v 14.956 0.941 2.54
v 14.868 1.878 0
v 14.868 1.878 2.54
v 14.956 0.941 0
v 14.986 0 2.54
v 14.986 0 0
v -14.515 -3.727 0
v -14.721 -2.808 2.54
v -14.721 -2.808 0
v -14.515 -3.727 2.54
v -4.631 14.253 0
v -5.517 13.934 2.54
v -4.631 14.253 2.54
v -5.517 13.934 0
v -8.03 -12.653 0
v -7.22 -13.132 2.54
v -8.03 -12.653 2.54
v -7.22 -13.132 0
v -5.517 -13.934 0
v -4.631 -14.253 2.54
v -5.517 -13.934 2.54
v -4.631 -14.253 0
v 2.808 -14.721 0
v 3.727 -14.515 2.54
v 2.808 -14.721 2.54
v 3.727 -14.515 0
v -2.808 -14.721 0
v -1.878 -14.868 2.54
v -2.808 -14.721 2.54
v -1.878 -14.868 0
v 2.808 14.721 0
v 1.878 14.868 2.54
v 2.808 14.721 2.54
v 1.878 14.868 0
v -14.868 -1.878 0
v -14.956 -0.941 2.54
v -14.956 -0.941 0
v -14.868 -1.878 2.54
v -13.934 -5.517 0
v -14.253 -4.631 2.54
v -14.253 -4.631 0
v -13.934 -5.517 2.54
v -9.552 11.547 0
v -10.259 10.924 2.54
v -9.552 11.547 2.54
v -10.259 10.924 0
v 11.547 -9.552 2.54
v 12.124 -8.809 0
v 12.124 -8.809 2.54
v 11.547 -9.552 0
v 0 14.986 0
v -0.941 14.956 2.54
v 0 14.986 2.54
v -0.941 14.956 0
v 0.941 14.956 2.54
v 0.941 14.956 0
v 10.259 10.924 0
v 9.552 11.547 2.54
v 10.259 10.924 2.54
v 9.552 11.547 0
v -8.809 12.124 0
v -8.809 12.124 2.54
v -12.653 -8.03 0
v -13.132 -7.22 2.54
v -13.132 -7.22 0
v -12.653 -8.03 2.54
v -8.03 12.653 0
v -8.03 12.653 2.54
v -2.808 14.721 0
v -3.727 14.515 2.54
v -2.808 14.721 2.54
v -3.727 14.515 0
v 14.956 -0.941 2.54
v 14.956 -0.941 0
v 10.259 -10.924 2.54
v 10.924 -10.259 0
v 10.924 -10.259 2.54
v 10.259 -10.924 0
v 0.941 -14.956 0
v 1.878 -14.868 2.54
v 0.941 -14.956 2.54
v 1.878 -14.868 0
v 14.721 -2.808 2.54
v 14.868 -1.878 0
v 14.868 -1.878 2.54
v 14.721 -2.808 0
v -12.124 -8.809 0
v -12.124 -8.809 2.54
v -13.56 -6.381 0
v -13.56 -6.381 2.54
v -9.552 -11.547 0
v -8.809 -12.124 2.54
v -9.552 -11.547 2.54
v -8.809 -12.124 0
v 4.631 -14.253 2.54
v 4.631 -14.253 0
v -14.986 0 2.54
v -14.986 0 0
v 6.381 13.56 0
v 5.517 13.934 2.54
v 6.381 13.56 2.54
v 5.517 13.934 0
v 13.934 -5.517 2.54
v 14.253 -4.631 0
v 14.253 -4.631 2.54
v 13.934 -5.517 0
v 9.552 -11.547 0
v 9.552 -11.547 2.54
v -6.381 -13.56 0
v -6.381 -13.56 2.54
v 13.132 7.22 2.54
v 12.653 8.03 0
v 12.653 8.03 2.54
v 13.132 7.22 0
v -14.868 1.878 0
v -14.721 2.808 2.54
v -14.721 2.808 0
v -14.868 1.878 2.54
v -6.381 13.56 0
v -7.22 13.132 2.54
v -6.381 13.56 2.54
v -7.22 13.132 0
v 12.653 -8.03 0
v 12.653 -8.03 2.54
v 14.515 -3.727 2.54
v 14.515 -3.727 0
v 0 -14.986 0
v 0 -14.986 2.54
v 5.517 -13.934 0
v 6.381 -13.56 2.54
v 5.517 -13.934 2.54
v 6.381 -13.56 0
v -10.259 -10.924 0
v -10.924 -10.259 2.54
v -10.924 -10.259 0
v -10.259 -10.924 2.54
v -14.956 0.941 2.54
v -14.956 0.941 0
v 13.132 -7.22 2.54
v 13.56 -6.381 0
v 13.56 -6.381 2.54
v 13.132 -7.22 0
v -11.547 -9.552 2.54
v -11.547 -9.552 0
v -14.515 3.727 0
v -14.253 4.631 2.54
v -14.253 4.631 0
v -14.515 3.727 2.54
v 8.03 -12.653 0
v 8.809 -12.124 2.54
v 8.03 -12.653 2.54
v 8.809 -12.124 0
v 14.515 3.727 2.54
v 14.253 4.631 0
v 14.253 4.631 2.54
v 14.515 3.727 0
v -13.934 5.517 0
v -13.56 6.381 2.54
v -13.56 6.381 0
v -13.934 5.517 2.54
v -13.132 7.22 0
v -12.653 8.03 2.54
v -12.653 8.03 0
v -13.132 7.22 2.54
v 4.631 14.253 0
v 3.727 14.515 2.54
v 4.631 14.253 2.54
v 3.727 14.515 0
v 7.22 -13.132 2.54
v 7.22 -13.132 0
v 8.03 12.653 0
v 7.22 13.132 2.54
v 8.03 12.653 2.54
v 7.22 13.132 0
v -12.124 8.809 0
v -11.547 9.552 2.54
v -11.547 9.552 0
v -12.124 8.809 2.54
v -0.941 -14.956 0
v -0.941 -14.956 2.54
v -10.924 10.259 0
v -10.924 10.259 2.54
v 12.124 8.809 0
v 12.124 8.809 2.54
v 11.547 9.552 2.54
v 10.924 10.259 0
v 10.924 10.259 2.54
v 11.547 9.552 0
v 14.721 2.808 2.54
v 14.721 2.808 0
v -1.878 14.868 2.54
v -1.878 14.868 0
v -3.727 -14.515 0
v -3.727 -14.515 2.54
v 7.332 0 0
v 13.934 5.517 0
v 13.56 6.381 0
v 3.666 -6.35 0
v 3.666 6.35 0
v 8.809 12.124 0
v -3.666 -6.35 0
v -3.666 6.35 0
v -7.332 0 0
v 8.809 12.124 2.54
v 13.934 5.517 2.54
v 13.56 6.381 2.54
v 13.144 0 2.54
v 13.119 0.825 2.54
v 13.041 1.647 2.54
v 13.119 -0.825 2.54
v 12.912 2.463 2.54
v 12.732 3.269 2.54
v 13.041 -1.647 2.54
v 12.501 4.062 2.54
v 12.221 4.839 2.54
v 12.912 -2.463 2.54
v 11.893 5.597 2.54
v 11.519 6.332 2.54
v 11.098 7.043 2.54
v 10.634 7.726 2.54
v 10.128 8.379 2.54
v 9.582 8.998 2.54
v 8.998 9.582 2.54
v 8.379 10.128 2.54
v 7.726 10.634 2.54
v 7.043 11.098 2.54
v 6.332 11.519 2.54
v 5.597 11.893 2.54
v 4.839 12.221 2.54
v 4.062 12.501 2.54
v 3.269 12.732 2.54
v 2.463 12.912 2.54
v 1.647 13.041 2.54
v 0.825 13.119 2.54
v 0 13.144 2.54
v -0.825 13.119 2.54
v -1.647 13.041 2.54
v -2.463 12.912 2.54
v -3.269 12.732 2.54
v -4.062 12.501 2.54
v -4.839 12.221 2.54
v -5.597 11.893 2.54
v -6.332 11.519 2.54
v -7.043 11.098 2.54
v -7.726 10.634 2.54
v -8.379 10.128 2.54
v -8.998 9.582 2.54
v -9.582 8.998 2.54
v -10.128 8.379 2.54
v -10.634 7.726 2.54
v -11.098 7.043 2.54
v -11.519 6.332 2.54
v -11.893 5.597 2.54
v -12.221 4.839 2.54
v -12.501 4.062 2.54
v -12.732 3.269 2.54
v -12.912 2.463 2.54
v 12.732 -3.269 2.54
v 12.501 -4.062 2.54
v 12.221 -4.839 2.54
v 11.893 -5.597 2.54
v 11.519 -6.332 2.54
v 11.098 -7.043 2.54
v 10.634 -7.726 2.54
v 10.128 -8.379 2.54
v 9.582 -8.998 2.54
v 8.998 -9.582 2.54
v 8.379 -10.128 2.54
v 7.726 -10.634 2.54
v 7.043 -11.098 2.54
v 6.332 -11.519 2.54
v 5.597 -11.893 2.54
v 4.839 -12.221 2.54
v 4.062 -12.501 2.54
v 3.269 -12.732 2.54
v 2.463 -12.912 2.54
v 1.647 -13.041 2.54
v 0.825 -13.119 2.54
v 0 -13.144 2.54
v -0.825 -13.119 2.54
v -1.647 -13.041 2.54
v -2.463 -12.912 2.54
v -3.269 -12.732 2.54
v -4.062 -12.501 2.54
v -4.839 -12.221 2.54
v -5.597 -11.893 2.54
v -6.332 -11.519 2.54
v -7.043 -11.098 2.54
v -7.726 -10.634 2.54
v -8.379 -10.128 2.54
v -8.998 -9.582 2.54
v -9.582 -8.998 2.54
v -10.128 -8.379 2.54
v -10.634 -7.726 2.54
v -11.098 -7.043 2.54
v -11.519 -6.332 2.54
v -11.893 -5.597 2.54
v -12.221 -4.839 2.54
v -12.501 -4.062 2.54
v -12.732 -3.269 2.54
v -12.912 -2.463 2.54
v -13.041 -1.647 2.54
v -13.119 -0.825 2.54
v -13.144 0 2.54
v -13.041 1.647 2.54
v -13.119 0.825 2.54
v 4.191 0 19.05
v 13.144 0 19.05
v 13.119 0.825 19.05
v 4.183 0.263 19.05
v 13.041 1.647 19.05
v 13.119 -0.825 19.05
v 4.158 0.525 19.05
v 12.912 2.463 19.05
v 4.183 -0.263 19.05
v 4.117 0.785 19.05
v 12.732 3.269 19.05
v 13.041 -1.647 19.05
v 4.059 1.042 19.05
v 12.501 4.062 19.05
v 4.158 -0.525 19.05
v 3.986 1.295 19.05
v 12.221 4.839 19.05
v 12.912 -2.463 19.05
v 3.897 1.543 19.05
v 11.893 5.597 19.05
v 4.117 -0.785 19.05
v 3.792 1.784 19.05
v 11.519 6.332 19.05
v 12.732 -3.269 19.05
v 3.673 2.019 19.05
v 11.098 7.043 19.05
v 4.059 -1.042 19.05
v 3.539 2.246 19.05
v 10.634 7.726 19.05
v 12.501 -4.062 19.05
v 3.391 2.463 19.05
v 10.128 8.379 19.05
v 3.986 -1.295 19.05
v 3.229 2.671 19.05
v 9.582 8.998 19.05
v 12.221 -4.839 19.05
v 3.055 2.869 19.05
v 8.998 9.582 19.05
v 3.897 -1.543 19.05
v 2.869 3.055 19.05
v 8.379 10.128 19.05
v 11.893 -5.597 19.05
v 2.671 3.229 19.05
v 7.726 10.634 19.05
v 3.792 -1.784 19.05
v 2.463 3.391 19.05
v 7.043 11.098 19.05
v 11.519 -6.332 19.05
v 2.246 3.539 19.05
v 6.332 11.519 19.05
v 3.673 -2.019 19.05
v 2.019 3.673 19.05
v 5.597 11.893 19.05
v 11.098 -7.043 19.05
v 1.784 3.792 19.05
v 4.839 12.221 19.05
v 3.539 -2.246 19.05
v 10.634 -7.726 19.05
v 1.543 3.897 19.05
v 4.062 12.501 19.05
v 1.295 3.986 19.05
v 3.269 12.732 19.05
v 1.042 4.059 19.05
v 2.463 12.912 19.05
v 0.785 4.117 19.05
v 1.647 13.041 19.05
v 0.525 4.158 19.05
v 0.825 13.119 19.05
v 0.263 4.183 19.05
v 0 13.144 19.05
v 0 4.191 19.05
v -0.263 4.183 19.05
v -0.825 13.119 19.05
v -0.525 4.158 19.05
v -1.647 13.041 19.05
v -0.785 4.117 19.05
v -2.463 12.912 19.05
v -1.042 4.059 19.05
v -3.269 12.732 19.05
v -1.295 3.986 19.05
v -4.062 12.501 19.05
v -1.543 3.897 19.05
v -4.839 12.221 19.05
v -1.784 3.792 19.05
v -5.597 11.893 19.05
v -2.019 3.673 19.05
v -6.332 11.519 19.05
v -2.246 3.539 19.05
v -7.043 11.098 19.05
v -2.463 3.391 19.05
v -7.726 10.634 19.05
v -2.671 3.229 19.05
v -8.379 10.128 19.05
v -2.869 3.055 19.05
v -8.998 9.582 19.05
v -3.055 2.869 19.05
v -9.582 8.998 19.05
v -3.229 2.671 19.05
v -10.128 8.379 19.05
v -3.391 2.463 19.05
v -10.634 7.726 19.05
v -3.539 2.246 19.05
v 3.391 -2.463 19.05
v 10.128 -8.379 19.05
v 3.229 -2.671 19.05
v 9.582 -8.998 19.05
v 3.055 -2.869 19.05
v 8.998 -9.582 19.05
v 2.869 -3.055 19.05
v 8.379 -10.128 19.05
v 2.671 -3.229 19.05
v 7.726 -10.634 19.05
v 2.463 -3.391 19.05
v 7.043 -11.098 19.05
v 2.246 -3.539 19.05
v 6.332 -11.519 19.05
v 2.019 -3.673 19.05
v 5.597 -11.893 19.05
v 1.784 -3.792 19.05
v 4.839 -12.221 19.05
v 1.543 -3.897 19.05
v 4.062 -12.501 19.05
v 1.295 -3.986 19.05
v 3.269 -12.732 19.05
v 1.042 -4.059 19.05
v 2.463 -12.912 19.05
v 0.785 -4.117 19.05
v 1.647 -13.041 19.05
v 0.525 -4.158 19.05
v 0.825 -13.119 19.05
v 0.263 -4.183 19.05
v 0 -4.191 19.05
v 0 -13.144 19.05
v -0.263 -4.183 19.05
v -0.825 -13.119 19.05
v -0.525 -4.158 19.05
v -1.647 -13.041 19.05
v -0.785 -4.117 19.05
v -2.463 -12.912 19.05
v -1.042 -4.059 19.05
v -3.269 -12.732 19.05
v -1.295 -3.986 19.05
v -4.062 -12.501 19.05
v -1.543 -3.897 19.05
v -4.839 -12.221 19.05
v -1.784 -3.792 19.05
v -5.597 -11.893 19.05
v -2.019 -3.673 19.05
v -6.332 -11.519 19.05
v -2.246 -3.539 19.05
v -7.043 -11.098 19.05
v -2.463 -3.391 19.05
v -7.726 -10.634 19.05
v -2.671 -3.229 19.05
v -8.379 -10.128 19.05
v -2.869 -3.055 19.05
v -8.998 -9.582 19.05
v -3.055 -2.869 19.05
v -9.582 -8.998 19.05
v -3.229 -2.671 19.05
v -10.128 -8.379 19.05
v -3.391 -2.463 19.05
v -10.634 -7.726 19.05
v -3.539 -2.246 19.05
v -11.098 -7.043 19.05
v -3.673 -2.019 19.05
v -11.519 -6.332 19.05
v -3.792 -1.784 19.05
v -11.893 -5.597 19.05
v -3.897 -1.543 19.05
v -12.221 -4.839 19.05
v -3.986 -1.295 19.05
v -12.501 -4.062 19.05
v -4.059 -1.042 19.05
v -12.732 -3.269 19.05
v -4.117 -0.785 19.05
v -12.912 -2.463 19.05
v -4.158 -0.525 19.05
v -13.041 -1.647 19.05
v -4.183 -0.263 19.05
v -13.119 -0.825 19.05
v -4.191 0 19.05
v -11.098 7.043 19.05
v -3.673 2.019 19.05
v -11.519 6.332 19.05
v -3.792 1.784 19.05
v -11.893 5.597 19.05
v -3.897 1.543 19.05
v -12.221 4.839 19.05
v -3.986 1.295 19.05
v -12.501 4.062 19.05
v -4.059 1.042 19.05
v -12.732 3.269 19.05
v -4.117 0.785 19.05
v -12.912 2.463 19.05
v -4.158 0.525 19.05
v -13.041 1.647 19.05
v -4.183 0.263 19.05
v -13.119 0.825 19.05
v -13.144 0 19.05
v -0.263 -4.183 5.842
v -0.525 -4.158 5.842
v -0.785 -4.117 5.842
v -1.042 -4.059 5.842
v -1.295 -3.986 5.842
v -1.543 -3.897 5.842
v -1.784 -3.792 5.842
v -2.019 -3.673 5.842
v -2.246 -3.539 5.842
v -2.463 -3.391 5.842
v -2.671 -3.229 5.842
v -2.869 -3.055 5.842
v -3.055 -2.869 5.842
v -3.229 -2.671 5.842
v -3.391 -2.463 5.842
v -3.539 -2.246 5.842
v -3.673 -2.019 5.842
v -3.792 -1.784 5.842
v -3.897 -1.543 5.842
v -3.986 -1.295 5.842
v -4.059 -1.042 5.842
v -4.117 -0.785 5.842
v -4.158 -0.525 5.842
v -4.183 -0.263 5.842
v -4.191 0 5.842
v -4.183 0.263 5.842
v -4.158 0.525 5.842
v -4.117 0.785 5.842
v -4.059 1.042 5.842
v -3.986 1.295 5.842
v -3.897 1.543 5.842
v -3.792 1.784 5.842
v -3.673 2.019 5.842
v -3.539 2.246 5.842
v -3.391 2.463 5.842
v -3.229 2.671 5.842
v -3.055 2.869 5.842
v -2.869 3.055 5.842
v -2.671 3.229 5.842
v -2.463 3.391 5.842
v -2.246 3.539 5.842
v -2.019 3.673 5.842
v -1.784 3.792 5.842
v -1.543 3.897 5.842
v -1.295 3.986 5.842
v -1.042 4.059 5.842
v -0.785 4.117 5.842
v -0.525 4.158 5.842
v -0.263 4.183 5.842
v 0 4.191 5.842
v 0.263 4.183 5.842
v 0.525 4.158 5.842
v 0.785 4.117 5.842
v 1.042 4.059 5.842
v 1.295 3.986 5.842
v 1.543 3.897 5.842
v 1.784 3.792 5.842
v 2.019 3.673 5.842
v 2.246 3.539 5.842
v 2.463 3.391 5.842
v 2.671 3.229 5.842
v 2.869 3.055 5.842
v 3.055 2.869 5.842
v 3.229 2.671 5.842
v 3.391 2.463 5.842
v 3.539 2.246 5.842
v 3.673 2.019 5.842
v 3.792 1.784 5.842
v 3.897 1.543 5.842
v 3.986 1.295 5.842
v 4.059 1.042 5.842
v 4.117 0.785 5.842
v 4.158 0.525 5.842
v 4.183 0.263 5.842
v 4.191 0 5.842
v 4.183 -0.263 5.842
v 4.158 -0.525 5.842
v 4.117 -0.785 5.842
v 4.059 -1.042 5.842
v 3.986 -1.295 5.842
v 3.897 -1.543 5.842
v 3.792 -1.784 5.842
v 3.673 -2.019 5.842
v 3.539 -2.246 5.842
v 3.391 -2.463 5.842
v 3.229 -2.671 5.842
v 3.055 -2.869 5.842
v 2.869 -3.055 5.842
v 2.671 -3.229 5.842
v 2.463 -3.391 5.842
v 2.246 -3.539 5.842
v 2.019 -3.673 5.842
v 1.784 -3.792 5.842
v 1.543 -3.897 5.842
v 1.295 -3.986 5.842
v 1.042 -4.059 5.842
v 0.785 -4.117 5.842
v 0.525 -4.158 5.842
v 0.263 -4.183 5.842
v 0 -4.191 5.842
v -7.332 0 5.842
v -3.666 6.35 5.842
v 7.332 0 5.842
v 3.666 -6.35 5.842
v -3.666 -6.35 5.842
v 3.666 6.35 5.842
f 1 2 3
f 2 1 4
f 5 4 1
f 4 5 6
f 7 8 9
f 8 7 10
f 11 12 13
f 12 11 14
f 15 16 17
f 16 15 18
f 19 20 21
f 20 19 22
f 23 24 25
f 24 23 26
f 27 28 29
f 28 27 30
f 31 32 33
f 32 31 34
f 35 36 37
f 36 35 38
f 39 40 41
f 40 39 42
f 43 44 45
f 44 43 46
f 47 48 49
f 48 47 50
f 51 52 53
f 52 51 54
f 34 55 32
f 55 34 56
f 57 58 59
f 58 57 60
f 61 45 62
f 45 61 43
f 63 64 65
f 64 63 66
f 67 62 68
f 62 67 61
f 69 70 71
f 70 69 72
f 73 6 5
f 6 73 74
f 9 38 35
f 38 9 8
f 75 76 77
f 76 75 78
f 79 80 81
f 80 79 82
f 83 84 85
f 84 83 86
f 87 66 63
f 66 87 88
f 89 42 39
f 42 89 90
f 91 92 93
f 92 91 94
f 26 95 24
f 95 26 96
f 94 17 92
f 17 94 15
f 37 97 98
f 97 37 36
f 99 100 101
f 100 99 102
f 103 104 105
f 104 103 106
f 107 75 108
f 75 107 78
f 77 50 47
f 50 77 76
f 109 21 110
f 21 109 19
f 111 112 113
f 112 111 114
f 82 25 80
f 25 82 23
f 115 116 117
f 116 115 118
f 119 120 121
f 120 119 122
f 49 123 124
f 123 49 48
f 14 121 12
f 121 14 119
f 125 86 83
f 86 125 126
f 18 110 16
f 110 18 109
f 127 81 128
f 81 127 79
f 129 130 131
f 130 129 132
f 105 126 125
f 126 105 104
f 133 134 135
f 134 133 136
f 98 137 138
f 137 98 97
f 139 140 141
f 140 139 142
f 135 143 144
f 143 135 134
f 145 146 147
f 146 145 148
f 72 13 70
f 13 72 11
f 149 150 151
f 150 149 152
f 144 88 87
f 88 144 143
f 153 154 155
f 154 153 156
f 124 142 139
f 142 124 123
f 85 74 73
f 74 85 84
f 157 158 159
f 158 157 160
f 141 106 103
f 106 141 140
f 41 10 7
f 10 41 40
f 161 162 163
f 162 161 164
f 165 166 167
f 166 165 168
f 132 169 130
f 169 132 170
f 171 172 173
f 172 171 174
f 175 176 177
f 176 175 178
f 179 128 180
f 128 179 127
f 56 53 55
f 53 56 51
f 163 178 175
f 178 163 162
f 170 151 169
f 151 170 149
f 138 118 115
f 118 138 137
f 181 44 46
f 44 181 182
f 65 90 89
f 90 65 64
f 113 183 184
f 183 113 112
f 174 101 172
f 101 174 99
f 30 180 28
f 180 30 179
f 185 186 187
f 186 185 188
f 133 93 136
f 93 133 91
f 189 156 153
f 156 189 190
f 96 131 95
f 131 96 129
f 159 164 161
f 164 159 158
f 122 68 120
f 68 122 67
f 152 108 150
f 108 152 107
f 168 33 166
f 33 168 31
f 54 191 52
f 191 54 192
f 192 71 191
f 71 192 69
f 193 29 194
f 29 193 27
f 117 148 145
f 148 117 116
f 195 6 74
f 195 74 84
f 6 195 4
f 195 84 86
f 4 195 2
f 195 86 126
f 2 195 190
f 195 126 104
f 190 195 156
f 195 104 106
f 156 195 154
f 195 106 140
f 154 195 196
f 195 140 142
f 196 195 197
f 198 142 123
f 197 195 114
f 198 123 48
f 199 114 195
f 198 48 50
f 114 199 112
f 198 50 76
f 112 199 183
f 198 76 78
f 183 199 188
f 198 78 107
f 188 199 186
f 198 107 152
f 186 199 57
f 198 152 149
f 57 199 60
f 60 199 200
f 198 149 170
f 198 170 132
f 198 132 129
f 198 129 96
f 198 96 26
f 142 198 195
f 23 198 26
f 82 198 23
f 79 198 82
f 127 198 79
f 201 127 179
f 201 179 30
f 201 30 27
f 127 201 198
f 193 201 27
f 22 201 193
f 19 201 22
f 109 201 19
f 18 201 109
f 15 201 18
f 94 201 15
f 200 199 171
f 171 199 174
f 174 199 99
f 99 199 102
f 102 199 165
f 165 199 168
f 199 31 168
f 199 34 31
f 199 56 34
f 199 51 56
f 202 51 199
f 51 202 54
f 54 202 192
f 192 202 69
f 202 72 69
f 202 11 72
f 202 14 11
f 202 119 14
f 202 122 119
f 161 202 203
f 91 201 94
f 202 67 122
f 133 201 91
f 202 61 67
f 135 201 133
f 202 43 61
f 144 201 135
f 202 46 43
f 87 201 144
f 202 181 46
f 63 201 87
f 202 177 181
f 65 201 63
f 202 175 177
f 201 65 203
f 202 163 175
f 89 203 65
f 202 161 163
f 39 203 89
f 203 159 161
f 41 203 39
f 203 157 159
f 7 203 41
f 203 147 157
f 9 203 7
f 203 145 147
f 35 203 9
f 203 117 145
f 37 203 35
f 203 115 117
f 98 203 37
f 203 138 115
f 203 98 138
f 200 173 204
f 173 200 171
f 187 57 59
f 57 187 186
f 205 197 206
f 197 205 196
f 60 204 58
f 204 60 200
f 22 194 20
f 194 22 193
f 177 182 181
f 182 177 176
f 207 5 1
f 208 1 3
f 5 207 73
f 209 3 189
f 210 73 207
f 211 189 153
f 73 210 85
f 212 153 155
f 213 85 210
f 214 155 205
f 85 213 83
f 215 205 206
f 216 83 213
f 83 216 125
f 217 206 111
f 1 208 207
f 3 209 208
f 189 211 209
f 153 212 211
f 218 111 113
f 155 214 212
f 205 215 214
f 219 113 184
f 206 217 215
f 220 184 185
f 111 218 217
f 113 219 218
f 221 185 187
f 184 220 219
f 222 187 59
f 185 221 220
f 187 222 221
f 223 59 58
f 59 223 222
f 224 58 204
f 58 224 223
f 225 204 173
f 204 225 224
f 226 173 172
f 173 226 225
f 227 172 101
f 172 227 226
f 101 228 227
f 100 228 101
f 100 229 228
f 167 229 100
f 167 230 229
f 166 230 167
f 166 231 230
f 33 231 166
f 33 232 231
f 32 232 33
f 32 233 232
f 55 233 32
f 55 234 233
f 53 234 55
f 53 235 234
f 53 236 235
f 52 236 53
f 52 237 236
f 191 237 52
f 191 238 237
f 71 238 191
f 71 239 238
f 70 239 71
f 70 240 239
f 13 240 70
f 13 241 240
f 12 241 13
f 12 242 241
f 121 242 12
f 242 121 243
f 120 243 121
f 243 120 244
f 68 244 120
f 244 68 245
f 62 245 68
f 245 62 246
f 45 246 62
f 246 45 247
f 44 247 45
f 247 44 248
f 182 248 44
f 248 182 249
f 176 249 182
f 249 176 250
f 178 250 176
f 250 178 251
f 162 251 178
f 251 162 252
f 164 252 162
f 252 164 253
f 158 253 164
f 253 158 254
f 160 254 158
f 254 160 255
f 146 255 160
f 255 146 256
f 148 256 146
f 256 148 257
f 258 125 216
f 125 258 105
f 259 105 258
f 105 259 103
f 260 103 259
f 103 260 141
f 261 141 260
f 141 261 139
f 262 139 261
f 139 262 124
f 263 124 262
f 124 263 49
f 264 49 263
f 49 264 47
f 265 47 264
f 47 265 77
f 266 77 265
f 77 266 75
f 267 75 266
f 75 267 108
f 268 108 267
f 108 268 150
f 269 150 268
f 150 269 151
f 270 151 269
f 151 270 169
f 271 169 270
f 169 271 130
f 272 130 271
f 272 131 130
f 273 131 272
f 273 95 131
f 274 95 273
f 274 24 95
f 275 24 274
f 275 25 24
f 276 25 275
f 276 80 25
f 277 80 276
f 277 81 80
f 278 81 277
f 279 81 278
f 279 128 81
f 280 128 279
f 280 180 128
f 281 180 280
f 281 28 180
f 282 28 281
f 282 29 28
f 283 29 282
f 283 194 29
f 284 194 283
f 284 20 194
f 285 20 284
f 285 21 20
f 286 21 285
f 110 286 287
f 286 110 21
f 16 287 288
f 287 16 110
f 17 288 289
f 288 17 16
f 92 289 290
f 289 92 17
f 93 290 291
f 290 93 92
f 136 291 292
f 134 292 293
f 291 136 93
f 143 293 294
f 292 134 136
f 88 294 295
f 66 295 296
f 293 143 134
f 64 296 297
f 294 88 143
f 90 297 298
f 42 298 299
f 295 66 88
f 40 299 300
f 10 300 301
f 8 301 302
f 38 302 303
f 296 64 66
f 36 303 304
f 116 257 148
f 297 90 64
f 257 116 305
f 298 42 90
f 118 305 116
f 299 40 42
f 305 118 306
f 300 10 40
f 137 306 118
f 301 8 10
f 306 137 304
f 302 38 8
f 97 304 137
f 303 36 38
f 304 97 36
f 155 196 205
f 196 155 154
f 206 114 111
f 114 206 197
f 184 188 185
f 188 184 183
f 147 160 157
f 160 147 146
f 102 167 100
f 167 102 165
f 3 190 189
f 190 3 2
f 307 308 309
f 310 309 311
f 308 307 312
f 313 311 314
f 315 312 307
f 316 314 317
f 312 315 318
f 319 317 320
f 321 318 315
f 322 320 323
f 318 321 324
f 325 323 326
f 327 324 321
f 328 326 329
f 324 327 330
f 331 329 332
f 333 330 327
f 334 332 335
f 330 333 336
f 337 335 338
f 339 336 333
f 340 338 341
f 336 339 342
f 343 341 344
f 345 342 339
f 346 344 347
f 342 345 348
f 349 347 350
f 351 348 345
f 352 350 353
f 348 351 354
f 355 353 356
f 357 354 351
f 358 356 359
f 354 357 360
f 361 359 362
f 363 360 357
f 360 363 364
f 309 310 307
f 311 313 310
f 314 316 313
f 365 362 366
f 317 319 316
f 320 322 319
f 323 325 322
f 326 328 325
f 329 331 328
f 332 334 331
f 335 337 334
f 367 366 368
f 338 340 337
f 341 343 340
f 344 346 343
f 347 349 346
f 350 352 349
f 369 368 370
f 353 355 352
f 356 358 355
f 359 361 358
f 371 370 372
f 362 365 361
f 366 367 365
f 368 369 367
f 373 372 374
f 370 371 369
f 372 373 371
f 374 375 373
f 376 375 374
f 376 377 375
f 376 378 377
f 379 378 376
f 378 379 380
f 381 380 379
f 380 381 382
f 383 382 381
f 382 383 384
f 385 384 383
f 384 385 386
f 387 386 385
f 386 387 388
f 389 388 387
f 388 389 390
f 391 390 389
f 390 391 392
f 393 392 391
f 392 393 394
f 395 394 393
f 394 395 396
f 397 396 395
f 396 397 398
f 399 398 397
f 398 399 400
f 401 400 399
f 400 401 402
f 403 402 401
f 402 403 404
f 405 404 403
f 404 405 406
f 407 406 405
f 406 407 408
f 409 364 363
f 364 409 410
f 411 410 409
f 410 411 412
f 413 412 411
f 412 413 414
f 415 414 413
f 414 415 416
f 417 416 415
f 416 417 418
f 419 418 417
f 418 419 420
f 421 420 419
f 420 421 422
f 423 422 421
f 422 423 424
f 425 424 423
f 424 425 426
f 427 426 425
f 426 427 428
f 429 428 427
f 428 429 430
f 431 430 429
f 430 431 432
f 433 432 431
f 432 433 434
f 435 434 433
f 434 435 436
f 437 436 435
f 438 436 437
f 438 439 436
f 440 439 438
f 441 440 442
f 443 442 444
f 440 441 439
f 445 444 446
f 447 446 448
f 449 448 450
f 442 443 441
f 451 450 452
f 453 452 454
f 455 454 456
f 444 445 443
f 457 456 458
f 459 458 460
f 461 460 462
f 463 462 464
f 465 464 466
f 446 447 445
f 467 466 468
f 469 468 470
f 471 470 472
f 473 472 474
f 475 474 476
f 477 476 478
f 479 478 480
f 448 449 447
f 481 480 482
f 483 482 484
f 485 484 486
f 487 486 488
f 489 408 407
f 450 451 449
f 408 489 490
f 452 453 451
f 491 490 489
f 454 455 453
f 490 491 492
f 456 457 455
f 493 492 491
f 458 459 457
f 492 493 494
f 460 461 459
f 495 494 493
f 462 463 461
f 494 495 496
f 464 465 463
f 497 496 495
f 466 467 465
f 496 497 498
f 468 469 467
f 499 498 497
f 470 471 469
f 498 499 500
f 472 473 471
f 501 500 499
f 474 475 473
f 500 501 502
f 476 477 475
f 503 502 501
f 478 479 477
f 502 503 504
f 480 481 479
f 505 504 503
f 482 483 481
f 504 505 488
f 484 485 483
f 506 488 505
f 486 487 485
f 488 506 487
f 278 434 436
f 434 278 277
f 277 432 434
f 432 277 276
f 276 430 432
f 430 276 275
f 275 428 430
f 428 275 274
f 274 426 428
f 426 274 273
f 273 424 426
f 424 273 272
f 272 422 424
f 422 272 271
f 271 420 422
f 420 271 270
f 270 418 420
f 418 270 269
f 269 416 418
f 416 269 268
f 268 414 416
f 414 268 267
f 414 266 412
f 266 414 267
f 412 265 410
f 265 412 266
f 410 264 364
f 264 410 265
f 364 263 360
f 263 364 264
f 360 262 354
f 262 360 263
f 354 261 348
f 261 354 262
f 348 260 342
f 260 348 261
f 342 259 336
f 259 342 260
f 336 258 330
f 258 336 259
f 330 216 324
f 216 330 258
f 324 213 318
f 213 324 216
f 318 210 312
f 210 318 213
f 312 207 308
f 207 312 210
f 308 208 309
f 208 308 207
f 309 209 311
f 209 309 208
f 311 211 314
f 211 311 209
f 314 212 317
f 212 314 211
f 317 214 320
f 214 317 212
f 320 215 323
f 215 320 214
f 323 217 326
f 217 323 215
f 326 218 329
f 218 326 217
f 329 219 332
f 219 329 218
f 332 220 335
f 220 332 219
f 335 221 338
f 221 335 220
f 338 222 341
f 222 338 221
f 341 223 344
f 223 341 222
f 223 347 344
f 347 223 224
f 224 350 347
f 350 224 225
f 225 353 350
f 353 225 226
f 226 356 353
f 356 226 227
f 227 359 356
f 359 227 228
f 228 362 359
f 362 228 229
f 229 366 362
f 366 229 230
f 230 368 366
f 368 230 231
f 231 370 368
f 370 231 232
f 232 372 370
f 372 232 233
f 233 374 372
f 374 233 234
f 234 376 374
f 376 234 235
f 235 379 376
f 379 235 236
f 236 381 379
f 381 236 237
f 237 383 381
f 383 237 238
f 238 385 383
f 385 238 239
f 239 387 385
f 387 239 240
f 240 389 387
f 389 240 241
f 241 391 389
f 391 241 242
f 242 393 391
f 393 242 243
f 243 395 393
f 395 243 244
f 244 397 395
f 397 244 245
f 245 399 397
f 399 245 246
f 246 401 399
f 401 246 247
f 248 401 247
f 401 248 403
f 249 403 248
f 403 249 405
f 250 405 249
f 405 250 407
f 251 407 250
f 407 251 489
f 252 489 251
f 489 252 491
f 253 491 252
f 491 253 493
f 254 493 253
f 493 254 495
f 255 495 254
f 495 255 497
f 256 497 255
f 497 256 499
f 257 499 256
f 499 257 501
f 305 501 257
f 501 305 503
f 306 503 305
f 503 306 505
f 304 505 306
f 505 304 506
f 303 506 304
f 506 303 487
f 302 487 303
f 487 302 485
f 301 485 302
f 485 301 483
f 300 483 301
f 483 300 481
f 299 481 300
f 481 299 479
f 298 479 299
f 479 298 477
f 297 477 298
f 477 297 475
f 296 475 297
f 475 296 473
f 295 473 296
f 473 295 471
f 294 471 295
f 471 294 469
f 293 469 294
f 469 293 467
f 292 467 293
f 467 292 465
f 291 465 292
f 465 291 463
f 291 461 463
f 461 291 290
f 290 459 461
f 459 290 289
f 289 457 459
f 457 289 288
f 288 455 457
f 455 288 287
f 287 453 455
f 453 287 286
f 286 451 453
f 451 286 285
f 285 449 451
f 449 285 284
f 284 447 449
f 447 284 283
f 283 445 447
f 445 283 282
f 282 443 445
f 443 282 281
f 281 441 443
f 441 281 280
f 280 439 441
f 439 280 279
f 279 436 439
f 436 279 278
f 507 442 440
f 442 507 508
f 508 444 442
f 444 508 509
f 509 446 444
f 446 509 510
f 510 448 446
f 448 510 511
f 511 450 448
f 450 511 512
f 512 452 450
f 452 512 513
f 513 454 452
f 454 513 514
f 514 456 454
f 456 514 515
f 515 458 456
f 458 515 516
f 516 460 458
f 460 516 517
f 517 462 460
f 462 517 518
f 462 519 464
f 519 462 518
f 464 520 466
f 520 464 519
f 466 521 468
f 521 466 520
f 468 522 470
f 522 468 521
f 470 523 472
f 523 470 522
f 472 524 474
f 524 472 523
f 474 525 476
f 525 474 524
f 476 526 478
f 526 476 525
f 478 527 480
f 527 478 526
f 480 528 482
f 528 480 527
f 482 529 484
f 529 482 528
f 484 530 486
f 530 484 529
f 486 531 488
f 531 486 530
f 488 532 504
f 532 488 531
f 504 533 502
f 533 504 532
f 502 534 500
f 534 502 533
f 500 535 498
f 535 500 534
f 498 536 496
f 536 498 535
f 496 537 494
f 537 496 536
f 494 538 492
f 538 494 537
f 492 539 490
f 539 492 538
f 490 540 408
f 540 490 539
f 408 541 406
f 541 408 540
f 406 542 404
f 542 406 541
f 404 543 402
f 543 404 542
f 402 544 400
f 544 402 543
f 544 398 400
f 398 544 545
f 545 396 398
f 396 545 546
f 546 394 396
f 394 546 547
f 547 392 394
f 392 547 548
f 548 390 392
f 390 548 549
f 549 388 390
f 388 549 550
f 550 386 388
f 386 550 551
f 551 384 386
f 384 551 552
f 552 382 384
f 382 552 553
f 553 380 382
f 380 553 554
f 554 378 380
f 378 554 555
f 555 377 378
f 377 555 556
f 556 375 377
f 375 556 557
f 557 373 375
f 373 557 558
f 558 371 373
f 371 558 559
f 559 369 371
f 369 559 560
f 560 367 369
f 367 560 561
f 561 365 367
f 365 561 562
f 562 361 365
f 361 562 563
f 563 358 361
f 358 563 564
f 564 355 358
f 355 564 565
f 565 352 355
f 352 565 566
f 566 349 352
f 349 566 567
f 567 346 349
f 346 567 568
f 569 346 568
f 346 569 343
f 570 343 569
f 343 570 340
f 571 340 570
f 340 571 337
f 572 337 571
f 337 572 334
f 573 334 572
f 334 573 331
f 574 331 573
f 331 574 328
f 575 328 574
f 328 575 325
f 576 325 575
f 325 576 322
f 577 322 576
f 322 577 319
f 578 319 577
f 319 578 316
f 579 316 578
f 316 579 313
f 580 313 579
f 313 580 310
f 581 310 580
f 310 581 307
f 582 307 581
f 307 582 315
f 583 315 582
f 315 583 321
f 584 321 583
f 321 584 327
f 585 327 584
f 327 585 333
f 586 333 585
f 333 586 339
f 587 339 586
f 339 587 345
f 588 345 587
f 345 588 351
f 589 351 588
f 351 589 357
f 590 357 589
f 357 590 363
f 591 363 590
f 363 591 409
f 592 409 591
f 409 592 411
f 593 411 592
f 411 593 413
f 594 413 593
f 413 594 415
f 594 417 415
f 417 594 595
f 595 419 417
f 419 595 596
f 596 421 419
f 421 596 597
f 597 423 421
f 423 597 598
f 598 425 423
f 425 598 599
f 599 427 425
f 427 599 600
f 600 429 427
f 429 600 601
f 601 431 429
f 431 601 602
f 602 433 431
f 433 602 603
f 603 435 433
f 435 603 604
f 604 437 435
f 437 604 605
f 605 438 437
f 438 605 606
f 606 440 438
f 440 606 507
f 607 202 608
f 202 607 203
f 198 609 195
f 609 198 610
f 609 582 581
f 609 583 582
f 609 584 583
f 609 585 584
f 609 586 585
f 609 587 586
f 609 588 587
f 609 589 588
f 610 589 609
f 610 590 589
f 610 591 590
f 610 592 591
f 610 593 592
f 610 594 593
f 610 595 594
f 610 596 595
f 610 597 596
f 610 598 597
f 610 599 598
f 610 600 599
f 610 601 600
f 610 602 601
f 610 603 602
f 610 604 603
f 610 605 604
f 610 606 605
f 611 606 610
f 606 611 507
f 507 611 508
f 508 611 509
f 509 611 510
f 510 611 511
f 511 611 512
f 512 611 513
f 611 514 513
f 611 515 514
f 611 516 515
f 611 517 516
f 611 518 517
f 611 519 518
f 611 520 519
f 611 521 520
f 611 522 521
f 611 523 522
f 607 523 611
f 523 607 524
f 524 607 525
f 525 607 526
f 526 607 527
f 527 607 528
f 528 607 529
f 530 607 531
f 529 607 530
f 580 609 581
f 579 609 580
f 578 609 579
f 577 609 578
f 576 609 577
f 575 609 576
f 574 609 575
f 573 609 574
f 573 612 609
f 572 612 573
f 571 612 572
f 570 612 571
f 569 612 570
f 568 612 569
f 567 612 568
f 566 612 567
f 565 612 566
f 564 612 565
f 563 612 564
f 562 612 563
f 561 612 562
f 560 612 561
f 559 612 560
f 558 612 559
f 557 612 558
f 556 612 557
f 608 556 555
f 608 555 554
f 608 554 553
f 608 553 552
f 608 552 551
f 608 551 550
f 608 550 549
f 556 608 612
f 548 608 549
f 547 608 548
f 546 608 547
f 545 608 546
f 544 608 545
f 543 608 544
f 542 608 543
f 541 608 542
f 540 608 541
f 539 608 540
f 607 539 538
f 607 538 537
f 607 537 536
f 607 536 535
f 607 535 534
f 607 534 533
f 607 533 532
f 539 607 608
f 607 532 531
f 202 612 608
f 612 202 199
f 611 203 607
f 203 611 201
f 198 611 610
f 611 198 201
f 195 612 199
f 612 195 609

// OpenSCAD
//treadmill roller fitting
difference(){
union(){
linear_extrude(height = .1*25.4)
circle(1.18*25.4/2,$fn=100);
linear_extrude(height = .75*25.4)
difference(){
circle(1.035*25.4/2,$fn=100);
circle(.33*25.4/2,$fn=100);
}
}
linear_extrude(height = 25.4*.23)
translate([0,0,0])
circle((.5*25.4/2)/cos(180/6), $fn=6);
}
